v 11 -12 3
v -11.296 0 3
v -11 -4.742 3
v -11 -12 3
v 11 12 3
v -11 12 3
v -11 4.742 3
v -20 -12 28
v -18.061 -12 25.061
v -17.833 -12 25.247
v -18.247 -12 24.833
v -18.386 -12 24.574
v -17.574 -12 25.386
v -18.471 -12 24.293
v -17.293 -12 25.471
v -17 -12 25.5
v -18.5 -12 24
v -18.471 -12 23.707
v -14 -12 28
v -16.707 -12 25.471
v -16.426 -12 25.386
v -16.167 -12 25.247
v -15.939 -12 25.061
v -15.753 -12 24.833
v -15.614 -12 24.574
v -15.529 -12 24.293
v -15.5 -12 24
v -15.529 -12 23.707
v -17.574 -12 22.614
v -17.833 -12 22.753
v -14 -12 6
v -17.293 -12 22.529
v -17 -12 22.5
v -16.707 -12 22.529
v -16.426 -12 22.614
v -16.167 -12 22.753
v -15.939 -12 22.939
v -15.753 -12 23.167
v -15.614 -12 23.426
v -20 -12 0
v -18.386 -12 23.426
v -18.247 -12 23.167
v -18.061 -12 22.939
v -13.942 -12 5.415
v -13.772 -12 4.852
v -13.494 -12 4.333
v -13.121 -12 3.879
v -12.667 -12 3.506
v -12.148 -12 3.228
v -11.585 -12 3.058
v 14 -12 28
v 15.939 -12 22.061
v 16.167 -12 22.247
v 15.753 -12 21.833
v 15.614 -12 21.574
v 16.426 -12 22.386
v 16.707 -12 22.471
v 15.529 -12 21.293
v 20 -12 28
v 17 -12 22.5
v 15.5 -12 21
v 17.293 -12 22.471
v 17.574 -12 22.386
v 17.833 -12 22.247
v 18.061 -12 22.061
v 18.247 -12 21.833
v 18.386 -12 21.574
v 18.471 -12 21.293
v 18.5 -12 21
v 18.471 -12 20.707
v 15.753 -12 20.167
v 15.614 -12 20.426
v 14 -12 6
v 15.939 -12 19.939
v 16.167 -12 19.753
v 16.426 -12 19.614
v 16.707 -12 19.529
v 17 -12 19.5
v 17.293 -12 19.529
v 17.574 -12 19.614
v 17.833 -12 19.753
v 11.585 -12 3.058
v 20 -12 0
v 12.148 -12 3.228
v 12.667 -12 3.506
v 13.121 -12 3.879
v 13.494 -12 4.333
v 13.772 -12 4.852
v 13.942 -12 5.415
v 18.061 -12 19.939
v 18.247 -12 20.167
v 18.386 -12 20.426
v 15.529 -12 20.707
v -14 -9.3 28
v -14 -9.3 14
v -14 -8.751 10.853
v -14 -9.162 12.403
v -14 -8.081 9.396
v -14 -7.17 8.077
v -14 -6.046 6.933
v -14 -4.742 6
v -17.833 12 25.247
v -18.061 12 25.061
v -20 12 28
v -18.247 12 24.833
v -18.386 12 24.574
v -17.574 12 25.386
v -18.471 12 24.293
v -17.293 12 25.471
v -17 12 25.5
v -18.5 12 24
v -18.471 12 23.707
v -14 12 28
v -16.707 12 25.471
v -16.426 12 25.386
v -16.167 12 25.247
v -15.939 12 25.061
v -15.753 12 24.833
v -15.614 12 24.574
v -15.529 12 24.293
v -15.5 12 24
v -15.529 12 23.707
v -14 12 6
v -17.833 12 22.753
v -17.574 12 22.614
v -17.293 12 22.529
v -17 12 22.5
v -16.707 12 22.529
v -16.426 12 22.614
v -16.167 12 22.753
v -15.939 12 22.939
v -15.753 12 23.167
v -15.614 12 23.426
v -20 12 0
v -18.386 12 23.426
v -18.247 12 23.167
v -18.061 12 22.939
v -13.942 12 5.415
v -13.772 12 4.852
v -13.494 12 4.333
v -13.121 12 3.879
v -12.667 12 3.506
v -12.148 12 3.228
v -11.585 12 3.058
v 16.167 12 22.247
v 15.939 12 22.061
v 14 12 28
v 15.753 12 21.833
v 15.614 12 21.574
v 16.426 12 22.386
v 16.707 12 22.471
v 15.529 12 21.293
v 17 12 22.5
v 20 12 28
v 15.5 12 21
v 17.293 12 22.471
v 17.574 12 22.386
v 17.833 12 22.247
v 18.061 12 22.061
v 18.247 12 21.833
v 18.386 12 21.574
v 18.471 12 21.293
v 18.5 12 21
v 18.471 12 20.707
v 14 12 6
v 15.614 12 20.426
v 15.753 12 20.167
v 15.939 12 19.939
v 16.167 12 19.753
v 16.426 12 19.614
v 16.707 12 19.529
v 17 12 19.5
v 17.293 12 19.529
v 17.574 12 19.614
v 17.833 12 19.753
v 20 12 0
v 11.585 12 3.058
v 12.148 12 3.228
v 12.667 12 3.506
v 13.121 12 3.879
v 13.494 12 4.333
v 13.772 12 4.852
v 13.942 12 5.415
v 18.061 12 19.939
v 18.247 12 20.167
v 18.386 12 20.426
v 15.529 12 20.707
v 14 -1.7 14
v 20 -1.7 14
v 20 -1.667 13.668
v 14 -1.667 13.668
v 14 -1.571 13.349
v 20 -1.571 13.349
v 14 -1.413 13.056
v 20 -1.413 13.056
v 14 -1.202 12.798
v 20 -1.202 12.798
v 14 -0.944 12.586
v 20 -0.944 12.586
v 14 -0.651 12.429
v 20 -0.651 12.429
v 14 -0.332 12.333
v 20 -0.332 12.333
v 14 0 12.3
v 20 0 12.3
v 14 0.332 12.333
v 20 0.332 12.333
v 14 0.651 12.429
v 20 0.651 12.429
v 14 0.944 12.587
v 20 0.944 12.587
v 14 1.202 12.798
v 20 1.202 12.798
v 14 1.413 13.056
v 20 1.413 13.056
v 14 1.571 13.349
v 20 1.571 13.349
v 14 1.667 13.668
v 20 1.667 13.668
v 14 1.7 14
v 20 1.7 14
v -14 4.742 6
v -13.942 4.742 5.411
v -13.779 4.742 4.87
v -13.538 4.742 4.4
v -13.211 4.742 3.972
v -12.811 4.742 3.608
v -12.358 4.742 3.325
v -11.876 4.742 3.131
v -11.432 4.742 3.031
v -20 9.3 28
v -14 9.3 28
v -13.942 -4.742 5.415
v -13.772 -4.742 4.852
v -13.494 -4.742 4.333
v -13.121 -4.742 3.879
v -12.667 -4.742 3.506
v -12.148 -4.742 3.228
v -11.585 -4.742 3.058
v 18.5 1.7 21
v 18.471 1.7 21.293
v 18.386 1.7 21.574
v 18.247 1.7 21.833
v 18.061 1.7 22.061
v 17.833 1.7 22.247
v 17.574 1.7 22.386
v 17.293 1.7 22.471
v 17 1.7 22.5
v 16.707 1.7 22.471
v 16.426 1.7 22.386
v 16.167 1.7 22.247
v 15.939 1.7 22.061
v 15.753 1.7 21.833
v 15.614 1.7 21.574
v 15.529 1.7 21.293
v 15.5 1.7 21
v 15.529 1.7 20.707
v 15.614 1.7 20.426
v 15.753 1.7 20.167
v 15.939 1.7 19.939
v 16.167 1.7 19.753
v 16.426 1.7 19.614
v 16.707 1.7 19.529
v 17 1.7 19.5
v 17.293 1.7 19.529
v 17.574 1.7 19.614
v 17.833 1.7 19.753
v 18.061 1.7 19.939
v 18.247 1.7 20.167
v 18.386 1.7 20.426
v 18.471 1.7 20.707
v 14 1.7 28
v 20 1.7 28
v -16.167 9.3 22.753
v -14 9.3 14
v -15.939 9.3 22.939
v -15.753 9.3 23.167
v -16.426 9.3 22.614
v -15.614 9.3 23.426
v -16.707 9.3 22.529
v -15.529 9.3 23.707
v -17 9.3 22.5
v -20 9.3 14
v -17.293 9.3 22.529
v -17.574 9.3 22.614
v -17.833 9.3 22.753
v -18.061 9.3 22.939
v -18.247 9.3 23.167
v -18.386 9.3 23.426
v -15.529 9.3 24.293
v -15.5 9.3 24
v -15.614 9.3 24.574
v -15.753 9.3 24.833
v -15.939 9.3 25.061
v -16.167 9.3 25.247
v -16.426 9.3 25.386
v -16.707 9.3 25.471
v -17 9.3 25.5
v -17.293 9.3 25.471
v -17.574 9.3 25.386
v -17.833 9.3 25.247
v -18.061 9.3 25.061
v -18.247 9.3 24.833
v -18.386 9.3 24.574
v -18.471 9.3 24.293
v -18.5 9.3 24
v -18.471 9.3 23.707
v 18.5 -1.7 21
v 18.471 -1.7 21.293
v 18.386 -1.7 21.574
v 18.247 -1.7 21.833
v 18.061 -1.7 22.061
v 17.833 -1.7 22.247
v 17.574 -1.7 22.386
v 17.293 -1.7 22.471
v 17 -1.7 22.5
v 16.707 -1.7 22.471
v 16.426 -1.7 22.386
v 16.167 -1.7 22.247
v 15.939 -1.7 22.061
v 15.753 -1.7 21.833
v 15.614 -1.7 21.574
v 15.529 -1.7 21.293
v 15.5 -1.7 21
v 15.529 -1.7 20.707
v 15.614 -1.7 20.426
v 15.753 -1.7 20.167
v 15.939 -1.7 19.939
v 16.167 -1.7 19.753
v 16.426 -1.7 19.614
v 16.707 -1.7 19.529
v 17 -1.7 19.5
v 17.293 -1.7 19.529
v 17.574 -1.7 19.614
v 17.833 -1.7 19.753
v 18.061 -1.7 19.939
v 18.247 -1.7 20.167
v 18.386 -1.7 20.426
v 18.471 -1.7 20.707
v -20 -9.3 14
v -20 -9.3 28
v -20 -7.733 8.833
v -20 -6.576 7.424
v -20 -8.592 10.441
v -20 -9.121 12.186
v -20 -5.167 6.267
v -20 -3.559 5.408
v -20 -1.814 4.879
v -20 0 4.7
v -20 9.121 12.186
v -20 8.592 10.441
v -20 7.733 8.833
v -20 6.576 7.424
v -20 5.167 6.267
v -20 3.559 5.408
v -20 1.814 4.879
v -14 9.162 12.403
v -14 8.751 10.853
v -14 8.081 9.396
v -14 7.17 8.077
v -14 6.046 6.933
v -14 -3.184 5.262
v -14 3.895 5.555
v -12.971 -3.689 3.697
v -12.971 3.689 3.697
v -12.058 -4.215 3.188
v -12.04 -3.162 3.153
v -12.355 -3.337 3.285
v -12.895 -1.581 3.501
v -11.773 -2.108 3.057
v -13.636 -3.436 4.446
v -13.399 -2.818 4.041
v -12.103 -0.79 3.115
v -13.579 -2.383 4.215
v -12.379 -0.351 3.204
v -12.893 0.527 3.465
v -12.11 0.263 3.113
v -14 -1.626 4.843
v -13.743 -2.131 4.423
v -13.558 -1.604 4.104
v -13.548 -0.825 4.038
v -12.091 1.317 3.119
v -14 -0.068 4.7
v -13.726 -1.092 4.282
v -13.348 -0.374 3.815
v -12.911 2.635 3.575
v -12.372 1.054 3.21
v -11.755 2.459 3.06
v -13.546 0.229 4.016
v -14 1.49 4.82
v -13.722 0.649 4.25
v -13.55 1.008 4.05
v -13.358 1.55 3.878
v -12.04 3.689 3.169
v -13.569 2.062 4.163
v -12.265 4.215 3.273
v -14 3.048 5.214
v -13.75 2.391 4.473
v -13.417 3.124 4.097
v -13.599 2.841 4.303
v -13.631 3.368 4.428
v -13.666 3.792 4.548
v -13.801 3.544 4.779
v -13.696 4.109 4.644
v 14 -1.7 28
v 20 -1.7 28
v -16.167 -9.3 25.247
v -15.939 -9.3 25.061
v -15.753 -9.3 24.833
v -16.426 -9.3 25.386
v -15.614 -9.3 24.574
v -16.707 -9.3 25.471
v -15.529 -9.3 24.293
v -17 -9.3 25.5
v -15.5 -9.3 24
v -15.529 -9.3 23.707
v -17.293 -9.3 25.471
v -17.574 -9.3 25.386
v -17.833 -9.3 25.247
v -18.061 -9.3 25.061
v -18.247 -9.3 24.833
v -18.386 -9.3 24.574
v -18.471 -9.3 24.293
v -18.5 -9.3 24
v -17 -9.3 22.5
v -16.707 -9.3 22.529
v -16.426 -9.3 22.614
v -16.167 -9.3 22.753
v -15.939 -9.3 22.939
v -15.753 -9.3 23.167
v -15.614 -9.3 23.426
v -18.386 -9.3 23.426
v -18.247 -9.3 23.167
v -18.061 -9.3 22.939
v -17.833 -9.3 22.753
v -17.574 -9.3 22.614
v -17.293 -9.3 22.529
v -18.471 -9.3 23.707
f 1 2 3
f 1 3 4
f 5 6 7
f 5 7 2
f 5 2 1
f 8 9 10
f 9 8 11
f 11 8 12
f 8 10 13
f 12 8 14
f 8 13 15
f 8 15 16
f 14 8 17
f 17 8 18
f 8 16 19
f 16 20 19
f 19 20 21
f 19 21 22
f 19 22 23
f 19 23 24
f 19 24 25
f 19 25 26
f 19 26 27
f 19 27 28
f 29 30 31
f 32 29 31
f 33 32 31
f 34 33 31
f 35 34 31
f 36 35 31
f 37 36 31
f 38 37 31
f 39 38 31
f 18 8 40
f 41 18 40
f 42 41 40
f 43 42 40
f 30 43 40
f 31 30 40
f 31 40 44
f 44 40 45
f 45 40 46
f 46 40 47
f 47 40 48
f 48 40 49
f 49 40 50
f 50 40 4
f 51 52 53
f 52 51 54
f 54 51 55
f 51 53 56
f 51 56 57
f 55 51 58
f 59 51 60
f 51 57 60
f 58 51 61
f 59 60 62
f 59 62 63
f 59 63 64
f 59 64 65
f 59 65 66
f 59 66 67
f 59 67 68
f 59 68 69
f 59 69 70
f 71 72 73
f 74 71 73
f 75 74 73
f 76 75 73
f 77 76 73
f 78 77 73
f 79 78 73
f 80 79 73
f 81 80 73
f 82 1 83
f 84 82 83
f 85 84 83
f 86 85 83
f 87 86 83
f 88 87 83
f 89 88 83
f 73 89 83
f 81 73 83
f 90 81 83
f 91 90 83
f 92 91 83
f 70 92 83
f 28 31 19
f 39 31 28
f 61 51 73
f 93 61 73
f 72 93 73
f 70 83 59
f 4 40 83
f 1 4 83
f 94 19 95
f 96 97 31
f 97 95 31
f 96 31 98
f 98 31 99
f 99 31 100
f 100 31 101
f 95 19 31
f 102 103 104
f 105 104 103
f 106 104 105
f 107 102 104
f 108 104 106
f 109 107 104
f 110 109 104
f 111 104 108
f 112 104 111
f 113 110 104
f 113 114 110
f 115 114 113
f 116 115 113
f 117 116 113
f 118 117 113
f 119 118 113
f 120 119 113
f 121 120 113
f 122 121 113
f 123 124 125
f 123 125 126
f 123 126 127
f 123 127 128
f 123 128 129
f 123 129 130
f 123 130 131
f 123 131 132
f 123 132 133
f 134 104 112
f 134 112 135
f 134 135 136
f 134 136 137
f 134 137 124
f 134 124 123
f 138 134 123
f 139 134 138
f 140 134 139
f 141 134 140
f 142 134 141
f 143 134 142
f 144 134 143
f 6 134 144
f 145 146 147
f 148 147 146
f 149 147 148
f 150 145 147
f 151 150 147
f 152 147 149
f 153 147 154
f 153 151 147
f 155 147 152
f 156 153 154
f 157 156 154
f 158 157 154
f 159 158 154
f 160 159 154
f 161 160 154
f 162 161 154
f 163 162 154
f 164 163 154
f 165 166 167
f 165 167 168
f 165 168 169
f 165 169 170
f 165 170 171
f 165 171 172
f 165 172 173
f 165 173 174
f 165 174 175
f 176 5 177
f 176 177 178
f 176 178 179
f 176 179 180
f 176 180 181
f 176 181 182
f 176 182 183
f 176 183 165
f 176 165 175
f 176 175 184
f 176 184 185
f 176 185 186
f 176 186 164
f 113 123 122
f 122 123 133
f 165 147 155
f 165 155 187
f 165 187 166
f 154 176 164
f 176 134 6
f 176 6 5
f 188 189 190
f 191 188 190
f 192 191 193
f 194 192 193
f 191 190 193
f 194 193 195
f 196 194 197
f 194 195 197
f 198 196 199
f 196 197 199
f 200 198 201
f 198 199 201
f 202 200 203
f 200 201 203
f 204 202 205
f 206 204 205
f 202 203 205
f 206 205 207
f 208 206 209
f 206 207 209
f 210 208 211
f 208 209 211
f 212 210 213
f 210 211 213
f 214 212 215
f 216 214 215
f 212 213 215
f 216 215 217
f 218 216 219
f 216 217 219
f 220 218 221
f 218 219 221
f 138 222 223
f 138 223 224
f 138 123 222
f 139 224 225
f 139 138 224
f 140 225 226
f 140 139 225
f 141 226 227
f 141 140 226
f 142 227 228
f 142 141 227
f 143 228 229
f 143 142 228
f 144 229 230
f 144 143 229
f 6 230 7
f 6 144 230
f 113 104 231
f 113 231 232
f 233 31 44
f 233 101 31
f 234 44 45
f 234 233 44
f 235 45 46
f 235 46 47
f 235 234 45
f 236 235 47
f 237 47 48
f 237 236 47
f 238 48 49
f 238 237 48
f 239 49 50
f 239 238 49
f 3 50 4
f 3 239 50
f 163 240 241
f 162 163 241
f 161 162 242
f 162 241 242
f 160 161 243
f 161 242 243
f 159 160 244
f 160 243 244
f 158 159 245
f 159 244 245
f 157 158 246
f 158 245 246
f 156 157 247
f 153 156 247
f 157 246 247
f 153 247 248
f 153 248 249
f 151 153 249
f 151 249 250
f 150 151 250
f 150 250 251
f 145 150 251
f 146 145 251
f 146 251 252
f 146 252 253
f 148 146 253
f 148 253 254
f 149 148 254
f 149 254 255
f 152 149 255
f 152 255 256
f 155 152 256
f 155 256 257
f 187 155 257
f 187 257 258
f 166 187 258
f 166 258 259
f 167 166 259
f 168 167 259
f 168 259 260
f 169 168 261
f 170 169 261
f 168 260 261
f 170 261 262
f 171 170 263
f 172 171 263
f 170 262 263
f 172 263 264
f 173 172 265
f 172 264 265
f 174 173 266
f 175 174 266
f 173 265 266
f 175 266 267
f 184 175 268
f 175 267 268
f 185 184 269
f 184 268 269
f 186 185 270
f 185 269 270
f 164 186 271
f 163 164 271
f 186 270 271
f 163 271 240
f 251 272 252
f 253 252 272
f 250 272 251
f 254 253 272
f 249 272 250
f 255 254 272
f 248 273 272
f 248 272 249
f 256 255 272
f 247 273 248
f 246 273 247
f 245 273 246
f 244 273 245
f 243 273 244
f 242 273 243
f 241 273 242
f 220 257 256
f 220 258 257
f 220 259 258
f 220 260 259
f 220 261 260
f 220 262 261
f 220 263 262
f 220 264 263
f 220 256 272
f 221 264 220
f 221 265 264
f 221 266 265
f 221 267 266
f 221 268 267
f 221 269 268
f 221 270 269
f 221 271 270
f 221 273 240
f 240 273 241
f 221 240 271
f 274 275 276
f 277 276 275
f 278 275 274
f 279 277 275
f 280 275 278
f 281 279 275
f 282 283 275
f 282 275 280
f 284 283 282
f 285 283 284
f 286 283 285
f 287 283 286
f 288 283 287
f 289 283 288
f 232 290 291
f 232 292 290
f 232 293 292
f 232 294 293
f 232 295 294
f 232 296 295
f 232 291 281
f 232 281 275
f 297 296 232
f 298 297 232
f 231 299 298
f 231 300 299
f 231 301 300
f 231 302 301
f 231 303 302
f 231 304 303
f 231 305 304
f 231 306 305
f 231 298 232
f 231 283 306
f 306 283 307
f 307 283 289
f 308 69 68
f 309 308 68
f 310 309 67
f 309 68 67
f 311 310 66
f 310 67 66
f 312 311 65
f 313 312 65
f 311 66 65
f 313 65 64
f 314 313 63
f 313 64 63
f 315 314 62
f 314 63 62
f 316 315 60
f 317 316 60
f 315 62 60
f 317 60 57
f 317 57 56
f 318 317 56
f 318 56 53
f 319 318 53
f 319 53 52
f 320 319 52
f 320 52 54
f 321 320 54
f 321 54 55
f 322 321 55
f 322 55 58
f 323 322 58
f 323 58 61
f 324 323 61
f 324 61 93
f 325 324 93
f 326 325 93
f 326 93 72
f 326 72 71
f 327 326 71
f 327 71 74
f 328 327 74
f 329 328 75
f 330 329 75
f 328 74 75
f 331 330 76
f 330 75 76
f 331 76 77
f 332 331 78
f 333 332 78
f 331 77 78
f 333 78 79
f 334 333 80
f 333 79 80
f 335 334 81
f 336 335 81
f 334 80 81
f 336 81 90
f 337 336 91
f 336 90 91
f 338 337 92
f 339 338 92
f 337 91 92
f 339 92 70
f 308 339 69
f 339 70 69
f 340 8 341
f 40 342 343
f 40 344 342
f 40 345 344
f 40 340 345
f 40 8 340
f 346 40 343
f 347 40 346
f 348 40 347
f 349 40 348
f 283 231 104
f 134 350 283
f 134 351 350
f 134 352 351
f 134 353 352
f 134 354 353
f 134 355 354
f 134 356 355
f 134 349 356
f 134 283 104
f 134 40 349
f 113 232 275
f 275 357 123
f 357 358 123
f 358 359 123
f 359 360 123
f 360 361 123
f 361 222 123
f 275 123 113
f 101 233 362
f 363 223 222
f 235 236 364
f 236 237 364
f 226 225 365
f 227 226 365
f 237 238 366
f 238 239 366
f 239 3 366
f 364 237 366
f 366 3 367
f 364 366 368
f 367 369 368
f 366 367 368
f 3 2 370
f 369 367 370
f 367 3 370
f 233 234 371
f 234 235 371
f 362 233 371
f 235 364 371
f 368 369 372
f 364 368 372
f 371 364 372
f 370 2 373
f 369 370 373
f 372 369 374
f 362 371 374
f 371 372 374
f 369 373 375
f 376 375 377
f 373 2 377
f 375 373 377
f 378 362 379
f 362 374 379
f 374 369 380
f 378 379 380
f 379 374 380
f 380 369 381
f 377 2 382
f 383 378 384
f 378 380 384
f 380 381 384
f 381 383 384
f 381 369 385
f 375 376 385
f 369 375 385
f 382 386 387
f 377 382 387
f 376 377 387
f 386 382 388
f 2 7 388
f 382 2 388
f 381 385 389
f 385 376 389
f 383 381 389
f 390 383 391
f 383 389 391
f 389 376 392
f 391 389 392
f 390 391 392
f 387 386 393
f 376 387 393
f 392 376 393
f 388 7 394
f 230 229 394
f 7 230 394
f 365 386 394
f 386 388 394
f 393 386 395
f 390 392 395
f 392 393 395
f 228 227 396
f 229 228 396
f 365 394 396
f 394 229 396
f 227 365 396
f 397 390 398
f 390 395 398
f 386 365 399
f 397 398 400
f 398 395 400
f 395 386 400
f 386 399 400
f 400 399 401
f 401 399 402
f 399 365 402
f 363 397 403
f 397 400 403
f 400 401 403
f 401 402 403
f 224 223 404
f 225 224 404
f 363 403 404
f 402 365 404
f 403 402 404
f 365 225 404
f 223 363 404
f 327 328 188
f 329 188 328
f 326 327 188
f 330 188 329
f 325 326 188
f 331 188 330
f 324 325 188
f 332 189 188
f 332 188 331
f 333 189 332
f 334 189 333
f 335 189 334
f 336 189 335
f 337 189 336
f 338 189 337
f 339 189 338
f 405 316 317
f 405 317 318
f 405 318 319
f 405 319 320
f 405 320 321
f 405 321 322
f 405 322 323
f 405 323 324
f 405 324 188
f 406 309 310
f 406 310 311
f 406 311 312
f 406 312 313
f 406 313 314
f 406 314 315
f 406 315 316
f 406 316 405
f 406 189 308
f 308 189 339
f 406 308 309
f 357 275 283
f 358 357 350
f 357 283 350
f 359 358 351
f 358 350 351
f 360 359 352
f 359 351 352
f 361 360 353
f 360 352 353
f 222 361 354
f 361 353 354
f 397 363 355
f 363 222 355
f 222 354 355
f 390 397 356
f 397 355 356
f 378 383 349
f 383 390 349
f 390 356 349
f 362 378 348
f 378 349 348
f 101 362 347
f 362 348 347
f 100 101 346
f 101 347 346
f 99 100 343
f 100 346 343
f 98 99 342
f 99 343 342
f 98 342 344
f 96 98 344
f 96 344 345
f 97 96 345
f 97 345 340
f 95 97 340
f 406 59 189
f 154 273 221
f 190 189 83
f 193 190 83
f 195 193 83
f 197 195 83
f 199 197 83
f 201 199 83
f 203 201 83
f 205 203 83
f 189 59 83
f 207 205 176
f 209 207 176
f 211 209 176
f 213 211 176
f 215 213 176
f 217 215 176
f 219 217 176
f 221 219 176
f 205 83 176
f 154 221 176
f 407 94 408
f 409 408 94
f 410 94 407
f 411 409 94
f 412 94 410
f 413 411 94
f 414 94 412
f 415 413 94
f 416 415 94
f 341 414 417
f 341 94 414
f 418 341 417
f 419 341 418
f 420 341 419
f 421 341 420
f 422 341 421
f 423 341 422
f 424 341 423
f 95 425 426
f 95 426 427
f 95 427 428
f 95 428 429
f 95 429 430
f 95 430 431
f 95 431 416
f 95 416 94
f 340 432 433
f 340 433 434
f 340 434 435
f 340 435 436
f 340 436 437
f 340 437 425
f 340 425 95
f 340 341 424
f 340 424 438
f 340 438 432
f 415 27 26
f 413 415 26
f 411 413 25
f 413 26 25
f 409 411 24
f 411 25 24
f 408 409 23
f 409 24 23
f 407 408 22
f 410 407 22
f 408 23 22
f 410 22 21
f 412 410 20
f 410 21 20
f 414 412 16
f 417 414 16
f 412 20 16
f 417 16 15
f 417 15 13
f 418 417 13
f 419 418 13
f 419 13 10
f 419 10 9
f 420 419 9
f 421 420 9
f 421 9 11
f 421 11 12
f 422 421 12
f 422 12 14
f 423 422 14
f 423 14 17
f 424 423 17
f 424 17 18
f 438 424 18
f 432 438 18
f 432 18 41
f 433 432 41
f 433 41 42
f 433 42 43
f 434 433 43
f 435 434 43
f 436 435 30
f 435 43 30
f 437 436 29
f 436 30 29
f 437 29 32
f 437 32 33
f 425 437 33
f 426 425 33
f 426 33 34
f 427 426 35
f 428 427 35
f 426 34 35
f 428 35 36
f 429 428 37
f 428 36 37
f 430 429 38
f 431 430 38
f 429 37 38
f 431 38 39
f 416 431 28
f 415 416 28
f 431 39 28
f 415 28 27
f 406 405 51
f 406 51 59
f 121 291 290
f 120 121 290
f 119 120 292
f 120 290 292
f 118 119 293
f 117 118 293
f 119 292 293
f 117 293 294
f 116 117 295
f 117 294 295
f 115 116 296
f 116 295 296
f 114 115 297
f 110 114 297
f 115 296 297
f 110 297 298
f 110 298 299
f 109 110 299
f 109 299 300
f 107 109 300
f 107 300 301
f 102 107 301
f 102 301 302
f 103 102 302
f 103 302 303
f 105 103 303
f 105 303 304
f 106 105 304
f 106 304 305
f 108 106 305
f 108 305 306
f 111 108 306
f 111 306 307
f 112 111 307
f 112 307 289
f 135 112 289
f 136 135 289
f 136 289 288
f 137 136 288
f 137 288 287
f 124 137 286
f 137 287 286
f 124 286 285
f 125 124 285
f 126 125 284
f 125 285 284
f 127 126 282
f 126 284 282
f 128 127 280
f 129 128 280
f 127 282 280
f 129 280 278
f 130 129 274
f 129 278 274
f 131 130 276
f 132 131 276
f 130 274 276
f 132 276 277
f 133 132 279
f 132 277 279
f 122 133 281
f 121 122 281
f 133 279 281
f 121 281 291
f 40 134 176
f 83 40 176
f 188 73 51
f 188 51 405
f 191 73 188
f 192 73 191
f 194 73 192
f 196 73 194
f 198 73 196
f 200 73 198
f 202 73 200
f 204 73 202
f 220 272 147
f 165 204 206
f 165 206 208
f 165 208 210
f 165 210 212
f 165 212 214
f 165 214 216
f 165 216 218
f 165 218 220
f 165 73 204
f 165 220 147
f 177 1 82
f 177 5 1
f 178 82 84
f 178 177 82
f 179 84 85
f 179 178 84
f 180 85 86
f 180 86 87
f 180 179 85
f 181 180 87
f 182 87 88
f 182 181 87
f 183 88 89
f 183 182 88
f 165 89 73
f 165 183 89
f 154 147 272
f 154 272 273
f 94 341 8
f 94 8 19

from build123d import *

# Parameters (mm, degrees)
SKETCH_W        = 40
SKETCH_H        = 24
PAD_DEPTH       = 3
SKETCH001_W     = 6
SKETCH001_H     = 24
PAD001_DEPTH    = 25
POCKET_DEPTH    = 6
POCKET001_DEPTH = 6
SKETCH005_R     = 1.5
POCKET002_DEPTH = 24.001
FILLET_R        = 3


with BuildPart() as part:
    # Sketch → Pad (new body)
    with BuildSketch(Plane.XY):
        Rectangle(SKETCH_W, SKETCH_H)
    extrude(amount=PAD_DEPTH)

    # Sketch001 (on Face6 of Pad) → Pad001 (join)
    with BuildSketch(Plane.XY.offset(3)):
        with Locations((-17, 0)):
            Rectangle(SKETCH001_W, SKETCH001_H)
        with Locations((17, 0)):
            Rectangle(SKETCH001_W, SKETCH001_H)
    extrude(amount=PAD001_DEPTH)

    # Sketch002 (on Face9 of Pad001) → Pocket (cut)
    with BuildSketch(Plane.YZ.offset(20)):
        with BuildLine():
            Line((-1.7, 28), (1.7, 28))
            Line((1.7, 28), (1.7, 13.999992))
            ThreePointArc((-1.7, 13.999989), (1e-06, 12.3), (1.7, 13.999992))
            Line((-1.7, 13.999989), (-1.7, 28))
        make_face()
    extrude(amount=-POCKET_DEPTH, mode=Mode.SUBTRACT)

    # Sketch004 (on Face12 of Pocket) → Pocket001 (cut)
    with BuildSketch(Plane(origin=(-20, 0, 0), x_dir=(0, -1, 0), z_dir=(-1, 0, 0))):
        with BuildLine():
            Line((-9.3, 28), (9.3, 28))
            Line((9.3, 28), (9.3, 14.000032))
            ThreePointArc((-9.3, 13.999973), (3e-05, 4.7), (9.3, 14.000032))
            Line((-9.3, 13.999973), (-9.3, 28))
        make_face()
    extrude(amount=-POCKET001_DEPTH, mode=Mode.SUBTRACT)

    # Sketch005 (on Face10 of Pocket001) → Pocket002 (cut, through all)
    with BuildSketch(Plane.XZ.offset(12)):
        with Locations((17, 21)):
            Circle(SKETCH005_R)
        with Locations((-17, 24)):
            Circle(SKETCH005_R)
    extrude(amount=-POCKET002_DEPTH, mode=Mode.SUBTRACT)

    # Fillet
    fillet_edges = [part.edges().sort_by_distance(p)[0] for p in [
        (-14, 0, 3),
        (14, 0, 3),
    ]]
    fillet(fillet_edges, radius=FILLET_R)


solid = part.part
